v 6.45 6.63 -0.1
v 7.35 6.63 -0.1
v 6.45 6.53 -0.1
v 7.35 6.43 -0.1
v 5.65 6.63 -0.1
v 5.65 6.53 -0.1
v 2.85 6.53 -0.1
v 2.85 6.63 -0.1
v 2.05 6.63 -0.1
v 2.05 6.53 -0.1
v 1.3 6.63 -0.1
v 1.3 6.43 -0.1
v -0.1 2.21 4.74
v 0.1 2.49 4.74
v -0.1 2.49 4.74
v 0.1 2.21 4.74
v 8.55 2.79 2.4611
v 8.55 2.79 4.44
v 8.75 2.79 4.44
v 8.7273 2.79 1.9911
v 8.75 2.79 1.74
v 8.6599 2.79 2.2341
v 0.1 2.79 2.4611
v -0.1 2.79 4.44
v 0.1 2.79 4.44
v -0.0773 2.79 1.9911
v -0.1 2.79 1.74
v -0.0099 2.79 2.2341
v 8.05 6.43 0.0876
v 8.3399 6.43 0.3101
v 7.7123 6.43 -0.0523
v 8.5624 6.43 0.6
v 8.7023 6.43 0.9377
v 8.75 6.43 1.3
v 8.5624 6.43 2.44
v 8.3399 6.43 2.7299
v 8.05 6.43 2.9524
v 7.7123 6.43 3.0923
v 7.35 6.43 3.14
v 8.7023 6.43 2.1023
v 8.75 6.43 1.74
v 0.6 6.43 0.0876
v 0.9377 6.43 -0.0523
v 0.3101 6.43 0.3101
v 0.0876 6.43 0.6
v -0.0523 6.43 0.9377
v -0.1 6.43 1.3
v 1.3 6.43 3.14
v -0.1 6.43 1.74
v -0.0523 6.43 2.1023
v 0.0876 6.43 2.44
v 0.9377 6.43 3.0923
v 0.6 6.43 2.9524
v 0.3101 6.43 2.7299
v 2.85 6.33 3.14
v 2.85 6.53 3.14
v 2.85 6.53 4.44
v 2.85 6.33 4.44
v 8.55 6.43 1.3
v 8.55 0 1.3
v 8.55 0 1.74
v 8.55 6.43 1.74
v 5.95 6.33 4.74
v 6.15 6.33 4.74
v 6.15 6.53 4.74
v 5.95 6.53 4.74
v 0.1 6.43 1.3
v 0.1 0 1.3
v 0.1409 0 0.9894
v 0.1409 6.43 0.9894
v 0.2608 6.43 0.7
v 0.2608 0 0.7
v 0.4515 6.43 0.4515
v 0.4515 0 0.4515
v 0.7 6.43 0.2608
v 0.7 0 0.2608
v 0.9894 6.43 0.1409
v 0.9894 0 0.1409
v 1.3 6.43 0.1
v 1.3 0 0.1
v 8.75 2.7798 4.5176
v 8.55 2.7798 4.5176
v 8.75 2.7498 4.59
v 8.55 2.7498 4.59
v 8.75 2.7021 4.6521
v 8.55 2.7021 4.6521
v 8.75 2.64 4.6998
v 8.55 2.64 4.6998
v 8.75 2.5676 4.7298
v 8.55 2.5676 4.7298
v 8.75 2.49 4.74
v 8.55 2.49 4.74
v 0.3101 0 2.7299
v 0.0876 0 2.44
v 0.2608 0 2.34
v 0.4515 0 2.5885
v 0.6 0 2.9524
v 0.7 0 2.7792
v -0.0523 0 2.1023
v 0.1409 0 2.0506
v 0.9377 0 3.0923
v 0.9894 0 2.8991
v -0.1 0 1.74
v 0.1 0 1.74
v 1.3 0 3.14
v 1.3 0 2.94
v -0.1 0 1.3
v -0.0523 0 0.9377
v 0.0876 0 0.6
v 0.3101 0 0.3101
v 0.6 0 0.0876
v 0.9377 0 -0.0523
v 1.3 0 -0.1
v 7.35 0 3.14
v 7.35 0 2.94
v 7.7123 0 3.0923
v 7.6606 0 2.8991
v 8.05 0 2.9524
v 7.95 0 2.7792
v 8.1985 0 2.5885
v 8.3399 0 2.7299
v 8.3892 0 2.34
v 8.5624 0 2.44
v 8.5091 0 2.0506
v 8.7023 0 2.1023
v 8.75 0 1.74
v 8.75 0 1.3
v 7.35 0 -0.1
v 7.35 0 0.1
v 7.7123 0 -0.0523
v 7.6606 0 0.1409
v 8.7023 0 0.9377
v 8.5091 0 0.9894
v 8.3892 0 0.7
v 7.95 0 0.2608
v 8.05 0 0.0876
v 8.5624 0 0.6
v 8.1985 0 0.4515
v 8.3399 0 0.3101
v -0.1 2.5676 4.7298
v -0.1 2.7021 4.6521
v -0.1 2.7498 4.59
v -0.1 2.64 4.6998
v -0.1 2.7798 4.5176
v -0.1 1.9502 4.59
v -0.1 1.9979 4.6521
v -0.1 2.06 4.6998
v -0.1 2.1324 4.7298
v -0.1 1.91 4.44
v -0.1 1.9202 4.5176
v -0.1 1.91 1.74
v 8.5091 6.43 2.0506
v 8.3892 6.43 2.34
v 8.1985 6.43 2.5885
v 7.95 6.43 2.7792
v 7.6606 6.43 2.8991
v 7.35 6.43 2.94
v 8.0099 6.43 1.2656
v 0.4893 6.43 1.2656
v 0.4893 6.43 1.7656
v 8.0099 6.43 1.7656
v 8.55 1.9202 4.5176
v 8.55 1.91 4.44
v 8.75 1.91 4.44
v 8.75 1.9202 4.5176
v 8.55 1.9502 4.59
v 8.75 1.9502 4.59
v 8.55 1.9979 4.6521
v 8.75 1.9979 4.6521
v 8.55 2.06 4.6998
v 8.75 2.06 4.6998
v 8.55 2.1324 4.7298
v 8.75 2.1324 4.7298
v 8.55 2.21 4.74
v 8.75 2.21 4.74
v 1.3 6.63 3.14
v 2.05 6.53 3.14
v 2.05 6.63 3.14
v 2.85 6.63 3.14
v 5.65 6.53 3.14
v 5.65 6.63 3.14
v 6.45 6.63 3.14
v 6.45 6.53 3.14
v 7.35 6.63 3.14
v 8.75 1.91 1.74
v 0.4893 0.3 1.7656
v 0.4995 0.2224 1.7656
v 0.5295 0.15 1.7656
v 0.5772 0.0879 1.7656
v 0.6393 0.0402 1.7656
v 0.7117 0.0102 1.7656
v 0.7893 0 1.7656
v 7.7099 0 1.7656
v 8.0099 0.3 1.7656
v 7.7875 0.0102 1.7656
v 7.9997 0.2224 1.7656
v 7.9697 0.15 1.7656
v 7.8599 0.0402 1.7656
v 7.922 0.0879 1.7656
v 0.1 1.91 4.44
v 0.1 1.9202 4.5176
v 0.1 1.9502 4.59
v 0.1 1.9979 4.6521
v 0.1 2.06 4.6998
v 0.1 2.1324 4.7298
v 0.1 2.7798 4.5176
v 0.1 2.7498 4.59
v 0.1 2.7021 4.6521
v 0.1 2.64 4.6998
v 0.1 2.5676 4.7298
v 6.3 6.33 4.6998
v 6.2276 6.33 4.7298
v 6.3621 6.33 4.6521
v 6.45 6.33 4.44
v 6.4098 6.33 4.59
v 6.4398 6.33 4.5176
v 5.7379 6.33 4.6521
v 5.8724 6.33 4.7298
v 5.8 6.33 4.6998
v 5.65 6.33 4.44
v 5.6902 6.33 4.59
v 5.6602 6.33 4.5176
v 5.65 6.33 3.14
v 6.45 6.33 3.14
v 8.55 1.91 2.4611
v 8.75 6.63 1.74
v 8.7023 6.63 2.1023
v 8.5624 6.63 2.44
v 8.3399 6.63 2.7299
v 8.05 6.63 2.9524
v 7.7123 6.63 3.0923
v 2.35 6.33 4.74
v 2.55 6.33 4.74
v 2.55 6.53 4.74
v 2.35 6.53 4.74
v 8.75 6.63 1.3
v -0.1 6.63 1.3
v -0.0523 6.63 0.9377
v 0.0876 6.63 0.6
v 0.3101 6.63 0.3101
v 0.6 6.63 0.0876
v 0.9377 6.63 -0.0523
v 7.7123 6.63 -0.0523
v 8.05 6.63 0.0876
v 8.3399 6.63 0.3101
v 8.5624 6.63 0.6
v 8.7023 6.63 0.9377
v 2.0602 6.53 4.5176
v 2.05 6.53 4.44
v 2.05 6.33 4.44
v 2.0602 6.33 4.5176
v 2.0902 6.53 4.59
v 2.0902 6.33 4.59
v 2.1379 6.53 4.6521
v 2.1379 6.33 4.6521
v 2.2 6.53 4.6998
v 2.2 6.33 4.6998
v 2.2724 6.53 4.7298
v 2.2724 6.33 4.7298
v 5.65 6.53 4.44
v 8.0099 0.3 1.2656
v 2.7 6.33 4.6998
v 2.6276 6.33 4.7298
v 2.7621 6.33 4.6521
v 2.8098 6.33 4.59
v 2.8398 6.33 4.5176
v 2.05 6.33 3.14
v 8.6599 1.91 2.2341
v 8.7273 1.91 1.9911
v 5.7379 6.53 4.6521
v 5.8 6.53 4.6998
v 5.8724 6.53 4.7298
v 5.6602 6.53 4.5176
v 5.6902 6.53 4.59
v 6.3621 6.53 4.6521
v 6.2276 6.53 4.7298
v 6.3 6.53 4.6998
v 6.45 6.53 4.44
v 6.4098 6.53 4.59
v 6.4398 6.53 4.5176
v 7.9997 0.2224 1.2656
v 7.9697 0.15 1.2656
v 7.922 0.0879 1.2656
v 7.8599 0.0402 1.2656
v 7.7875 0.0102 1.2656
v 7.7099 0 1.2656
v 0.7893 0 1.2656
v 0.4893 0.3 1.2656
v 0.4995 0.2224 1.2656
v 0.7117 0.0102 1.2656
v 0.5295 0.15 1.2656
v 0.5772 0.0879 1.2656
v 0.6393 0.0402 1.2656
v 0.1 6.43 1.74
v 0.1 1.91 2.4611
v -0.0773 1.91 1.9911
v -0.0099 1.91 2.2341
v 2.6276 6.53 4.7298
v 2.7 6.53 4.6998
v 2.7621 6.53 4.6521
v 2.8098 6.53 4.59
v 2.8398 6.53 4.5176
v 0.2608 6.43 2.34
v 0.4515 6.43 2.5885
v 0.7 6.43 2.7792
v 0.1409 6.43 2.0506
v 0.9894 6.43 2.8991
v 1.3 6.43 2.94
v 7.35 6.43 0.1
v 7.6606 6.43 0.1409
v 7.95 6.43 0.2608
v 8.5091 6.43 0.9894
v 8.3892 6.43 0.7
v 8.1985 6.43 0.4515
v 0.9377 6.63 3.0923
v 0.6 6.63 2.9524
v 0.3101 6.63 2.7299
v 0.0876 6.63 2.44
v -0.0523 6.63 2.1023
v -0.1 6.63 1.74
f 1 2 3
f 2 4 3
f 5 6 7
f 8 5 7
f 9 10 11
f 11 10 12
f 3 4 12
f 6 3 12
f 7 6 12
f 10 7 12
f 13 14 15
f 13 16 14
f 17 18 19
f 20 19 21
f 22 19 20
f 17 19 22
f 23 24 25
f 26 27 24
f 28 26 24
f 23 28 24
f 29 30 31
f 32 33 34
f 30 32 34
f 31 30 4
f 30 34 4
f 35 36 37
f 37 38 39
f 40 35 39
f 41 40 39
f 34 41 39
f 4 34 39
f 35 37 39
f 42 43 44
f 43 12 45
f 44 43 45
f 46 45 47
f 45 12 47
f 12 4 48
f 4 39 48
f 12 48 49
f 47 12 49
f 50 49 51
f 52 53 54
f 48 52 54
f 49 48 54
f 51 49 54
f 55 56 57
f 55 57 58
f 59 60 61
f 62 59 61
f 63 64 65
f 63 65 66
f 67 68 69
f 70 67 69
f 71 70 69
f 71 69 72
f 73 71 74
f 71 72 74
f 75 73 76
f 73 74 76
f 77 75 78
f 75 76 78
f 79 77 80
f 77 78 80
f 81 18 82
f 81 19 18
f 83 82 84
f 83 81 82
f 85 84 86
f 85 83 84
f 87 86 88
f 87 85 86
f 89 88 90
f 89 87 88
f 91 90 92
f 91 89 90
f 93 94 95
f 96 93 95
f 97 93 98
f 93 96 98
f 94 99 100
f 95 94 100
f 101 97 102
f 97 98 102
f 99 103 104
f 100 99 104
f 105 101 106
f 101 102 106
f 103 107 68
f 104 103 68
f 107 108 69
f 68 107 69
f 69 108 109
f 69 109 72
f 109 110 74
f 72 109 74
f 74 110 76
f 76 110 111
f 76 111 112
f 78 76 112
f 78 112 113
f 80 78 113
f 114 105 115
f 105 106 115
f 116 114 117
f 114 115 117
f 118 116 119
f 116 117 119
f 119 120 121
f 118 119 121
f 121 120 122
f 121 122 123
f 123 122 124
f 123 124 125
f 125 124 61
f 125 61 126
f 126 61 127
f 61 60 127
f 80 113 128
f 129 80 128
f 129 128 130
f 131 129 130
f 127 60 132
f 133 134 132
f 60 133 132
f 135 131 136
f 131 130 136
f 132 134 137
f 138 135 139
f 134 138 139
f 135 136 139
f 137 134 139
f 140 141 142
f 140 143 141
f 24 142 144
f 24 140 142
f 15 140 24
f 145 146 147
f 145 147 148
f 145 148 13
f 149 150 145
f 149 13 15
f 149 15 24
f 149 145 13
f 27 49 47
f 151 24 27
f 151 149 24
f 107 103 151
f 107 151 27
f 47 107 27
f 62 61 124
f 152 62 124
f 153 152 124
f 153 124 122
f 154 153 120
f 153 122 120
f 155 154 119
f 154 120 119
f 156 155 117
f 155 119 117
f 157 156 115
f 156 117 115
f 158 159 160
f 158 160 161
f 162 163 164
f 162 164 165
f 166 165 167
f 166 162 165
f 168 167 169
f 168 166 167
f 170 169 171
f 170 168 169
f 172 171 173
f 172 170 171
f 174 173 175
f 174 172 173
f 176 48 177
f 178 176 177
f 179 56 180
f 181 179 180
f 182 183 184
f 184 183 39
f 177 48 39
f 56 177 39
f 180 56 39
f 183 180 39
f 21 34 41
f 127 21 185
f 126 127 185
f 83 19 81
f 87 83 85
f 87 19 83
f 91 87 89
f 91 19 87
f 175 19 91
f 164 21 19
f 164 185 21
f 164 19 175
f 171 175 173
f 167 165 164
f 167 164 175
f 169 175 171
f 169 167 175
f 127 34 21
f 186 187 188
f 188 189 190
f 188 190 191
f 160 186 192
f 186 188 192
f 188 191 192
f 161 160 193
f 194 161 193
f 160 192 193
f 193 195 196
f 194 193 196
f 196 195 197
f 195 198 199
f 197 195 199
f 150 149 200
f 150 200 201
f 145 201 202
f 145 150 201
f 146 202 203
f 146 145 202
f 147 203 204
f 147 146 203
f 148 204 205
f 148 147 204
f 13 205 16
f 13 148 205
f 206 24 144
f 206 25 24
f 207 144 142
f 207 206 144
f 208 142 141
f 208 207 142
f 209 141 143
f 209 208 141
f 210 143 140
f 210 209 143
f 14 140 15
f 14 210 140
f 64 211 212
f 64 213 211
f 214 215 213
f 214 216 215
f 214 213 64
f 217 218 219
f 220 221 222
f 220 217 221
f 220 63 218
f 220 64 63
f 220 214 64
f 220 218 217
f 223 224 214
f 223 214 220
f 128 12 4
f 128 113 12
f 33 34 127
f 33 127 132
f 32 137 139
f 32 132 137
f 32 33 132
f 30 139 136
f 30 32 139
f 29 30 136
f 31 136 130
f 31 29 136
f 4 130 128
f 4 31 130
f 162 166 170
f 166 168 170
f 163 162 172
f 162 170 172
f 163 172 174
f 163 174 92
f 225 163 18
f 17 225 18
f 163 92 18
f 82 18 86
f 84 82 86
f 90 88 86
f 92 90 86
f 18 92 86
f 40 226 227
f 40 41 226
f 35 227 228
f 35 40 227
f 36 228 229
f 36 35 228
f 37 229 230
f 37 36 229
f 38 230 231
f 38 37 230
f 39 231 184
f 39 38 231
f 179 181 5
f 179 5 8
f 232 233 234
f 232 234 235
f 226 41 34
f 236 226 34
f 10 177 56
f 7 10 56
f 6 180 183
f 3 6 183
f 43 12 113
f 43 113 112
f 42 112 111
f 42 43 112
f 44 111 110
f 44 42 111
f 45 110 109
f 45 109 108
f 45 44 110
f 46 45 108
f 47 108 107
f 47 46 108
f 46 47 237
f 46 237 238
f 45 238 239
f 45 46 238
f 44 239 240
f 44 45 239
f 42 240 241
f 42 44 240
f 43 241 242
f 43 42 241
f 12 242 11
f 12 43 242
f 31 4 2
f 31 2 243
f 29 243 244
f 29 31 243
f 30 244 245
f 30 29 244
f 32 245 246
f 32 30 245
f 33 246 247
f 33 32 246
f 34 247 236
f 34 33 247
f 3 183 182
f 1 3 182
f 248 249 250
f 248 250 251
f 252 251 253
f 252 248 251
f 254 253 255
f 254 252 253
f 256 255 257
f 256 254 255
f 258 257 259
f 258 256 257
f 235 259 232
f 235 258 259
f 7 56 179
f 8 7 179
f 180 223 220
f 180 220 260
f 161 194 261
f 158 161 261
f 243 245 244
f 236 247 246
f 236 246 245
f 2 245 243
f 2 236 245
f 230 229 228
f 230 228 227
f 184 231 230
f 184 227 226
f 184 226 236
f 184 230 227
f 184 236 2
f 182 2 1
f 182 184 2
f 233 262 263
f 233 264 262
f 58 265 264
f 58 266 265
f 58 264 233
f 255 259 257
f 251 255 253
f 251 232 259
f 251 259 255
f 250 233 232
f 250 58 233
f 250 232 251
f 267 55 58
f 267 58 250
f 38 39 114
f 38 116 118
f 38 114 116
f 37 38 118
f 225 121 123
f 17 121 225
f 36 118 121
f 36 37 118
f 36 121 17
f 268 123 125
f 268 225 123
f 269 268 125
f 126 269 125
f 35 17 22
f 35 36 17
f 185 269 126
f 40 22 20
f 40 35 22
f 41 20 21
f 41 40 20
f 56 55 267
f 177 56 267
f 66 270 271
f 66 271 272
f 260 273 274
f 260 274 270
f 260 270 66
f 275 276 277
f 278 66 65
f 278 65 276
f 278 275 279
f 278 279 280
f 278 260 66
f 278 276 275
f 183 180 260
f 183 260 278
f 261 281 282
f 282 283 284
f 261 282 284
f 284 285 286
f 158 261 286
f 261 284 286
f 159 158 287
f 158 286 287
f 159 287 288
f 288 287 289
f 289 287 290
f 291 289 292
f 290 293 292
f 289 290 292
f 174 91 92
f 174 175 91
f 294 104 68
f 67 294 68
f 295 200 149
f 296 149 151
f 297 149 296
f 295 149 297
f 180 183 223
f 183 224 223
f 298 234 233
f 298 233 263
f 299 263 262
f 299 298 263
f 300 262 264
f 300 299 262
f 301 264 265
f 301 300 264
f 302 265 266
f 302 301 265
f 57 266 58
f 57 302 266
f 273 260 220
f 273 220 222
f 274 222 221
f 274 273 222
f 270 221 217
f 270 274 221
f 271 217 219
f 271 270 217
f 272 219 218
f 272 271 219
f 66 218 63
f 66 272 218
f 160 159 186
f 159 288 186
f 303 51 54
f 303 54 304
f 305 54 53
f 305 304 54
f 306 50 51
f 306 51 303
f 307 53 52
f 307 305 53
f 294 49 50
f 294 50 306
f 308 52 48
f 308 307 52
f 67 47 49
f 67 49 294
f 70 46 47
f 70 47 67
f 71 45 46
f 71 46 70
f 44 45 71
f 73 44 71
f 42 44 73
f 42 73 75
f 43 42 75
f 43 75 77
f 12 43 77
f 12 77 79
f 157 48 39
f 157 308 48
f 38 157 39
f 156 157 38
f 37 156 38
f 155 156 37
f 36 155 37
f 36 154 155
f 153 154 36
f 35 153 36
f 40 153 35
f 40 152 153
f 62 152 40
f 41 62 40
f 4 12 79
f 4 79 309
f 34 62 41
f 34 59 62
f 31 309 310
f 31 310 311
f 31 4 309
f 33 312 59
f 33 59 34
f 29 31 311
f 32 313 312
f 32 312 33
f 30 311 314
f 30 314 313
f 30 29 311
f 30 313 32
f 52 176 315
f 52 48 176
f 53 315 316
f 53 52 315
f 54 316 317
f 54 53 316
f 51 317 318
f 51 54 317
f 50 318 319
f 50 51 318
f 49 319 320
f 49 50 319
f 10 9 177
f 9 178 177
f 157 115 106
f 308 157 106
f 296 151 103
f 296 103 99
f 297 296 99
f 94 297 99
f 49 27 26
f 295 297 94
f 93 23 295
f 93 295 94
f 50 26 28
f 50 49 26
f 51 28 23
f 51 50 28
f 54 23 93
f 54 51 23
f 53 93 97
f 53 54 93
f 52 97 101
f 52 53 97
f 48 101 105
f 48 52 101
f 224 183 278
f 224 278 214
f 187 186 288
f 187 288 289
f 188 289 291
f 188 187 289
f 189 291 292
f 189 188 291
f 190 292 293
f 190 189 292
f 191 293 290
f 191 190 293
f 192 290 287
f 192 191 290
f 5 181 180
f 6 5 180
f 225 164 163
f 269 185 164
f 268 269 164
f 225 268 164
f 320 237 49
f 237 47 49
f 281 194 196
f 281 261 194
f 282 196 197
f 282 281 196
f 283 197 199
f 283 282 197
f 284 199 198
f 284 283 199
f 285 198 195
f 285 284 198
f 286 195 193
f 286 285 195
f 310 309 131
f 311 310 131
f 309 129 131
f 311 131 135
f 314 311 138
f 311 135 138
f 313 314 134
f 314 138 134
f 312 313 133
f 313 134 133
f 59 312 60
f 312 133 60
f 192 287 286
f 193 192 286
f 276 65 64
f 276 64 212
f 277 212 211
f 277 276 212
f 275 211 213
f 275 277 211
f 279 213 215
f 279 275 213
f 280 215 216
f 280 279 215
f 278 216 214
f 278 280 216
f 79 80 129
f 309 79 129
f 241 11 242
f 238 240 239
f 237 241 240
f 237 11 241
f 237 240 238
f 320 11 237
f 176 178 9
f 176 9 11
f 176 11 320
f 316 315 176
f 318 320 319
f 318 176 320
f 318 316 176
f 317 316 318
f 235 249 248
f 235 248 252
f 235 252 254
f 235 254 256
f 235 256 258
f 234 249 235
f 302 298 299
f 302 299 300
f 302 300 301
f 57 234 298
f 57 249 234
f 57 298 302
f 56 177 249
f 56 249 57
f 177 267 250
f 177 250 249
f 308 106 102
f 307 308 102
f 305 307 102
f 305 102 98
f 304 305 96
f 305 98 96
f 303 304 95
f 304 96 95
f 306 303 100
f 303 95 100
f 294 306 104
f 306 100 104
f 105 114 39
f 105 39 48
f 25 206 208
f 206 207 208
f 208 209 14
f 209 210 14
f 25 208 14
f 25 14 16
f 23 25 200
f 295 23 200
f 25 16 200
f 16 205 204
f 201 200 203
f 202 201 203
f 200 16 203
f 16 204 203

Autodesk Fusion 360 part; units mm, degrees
sketch "Sketch1" plane through (0, 0, 0) normal (0, 1, 0) x (1, 0, 0)
  line L0 (0.1, -0.1) -> (8.55, -0.1) construction
  line L1 (8.55, -0.1) -> (8.55, -2.94) construction
  line L2 (8.55, -2.94) -> (0.1, -2.94) construction
  line L3 (0.1, -2.94) -> (0.1, -0.1) construction
  line L4 (-0.1, 0.1) -> (8.75, 0.1)
  line L5 (8.75, 0.1) -> (8.75, -3.14)
  line L6 (8.75, -3.14) -> (-0.1, -3.14)
  line L7 (-0.1, -3.14) -> (-0.1, 0.1)
  line L8 (0, 0) -> (8.65, 0) construction
  line L9 (8.65, 0) -> (8.65, -3.04) construction
  line L10 (8.65, -3.04) -> (0, -3.04) construction
  line L11 (0, -3.04) -> (0, 0) construction
  dimension "d4" = -0.2
  dimension "d5" = -0.1
extrude "Extrude1" add sketch "Sketch1" along normal blind 6.43 makes body 1
fillet "Fillet1" radius 1.4 4 edges at (8.75, 3.215, 3.14) (8.75, 3.215, -0.1) (-0.1, 3.215, 3.14) (-0.1, 3.215, -0.1) on bodies 1
sketch "Sketch2" plane through (0, 0, 0) normal (0, -1, 0) x (1, 0, 0)
  arc A0 (-0.1, 1.3) -> (1.3, -0.1) centre (1.3, 1.3) ccw
  line L0 (1.3, -0.1) -> (7.35, -0.1)
  arc A1 (7.35, -0.1) -> (8.75, 1.3) centre (7.35, 1.3) ccw
  line L1 (8.75, 1.3) -> (8.75, 1.74)
  arc A2 (8.75, 1.74) -> (7.35, 3.14) centre (7.35, 1.74) ccw
  line L2 (7.35, 3.14) -> (1.3, 3.14)
  arc A3 (1.3, 3.14) -> (-0.1, 1.74) centre (1.3, 1.74) ccw
  line L3 (-0.1, 1.74) -> (-0.1, 1.3)
  line L4 (0.1, 1.74) -> (0.1, 1.3)
  arc A4 (0.1, 1.3) -> (1.3, 0.1) centre (1.3, 1.3) ccw
  line L5 (1.3, 0.1) -> (7.35, 0.1)
  arc A5 (7.35, 0.1) -> (8.55, 1.3) centre (7.35, 1.3) ccw
  line L6 (8.55, 1.3) -> (8.55, 1.74)
  arc A6 (8.55, 1.74) -> (7.35, 2.94) centre (7.35, 1.74) ccw
  line L7 (7.35, 2.94) -> (1.3, 2.94)
  arc A7 (1.3, 2.94) -> (0.1, 1.74) centre (1.3, 1.74) ccw
  dimension "d10" = -0.2
extrude "Extrude2" cut sketch "Sketch2" against normal blind 6.43 contours L4 A4 L5 A5 L6 A6 L7 A7 bodies 1
sketch "Sketch3" plane through (0, 6.43, 0) normal (0, 1, 0) x (-1, 0, 0)
  line L0 (-0.1, 1.74) -> (-0.1, 1.3)
  arc A0 (-1.3, 0.1) -> (-0.1, 1.3) centre (-1.3, 1.3) ccw
  line L1 (-1.3, 0.1) -> (-7.35, 0.1)
  arc A1 (-8.55, 1.3) -> (-7.35, 0.1) centre (-7.35, 1.3) ccw
  line L2 (-8.55, 1.3) -> (-8.55, 1.74)
  arc A2 (-7.35, 2.94) -> (-8.55, 1.74) centre (-7.35, 1.74) ccw
  line L3 (-7.35, 2.94) -> (-1.3, 2.94)
  arc A3 (-0.1, 1.74) -> (-1.3, 2.94) centre (-1.3, 1.74) ccw
  arc A4 (-1.3, -0.1) -> (0.1, 1.3) centre (-1.3, 1.3) ccw
  line L4 (0.1, 1.3) -> (0.1, 1.74)
  arc A5 (0.1, 1.74) -> (-1.3, 3.14) centre (-1.3, 1.74) ccw
  line L5 (-1.3, 3.14) -> (-7.35, 3.14)
  arc A6 (-7.35, 3.14) -> (-8.75, 1.74) centre (-7.35, 1.74) ccw
  line L6 (-8.75, 1.74) -> (-8.75, 1.3)
  arc A7 (-8.75, 1.3) -> (-7.35, -0.1) centre (-7.35, 1.3) ccw
  line L7 (-7.35, -0.1) -> (-1.3, -0.1)
  line L8 (-7.35, 3.14) -> (-1.3, 3.14)
  line L9 (0.1, 1.74) -> (0.1, 1.3)
  line L10 (-1.3, -0.1) -> (-7.35, -0.1)
  line L11 (-8.75, 1.3) -> (-8.75, 1.74)
  spline S0 degree 5 poles (-7.35, -0.1) (-7.4476, -0.1) (-7.6354, -0.0851) (-7.8944, -0.0183) (-8.1972, 0.1488) (-8.5012, 0.4528) (-8.6683, 0.7556) (-8.7351, 1.0146) (-8.75, 1.2024) (-8.75, 1.3) knots 0 0 0 0 0 0 0.2 0.4 0.6 0.8 1 1 1 1 1 1
  spline S1 degree 5 poles (-8.75, 1.74) (-8.75, 1.8376) (-8.7351, 2.0254) (-8.6683, 2.2844) (-8.5012, 2.5872) (-8.1972, 2.8912) (-7.8944, 3.0583) (-7.6354, 3.1251) (-7.4476, 3.14) (-7.35, 3.14) knots 0 0 0 0 0 0 0.2 0.4 0.6 0.8 1 1 1 1 1 1
  spline S2 degree 5 poles (-1.3, -0.1) (-1.2024, -0.1) (-1.0146, -0.0851) (-0.7556, -0.0183) (-0.4528, 0.1488) (-0.1488, 0.4528) (0.0183, 0.7556) (0.0851, 1.0146) (0.1, 1.2024) (0.1, 1.3) knots 0 0 0 0 0 0 0.2 0.4 0.6 0.8 1 1 1 1 1 1
  spline S3 degree 5 poles (0.1, 1.74) (0.1, 1.8376) (0.0851, 2.0254) (0.0183, 2.2844) (-0.1488, 2.5872) (-0.4528, 2.8912) (-0.7556, 3.0583) (-1.0146, 3.1251) (-1.2024, 3.14) (-1.3, 3.14) knots 0 0 0 0 0 0 0.2 0.4 0.6 0.8 1 1 1 1 1 1
extrude "Extrude3" add sketch "Sketch3" along normal blind 0.2 separate body contours L0 A0 L1 A1 L2 A2 L3 A3 | A4 L4 A5 L5 A6 L6 A7 L7 L8 L9 L10 L11 S0 S1 S2 S3 makes body 2
sketch "Sketch4" plane through (0, 0, 0) normal (0, 1, 0) x (1, 0, 0)
  line L0 (8.6991, -3.1025) -> (0, 0) construction
  line L1 (-0.1103, -3.1118) -> (8.7397, 0.1282) construction
  line L2 (4.2496, -1.5156) -> (4.3035, 0.7511) construction
  line L3 (8.0099, -1.2656) -> (0.4893, -1.2656)
  line L4 (0.4893, -1.2656) -> (0.4893, -1.7656)
  line L5 (0.4893, -1.7656) -> (8.0099, -1.7656)
  line L6 (8.0099, -1.7656) -> (8.0099, -1.2656)
  line L7 (8.0099, -1.2656) -> (0.4893, -1.7656) construction
  line L8 (0.4893, -1.2656) -> (8.0099, -1.7656) construction
  point P0 (4.2496, -1.5156)
  dimension "d15" = 0.5
extrude "Extrude4" add sketch "Sketch4" along normal blind 6.43 separate body makes body 3
fillet "Fillet2" radius 0.3 2 edges at (8.0099, 0, 1.5156) (0.4893, 0, 1.5156) on bodies 3
sketch "Sketch5" plane through (0, 0, 3.14) normal (0, 0, 1) x (-1, 0, 0)
  line L0 (-1.3, -6.43) -> (-1.3, 0)
  line L1 (-1.3, 0) -> (-7.35, 0)
  line L2 (-7.35, 0) -> (-7.35, -6.43)
  line L3 (-7.35, -6.43) -> (-1.3, -6.43)
  line L4 (-4.25, 0.05) -> (-4.25, -8) construction
  line L5 (0, 0) -> (-8.7598, -6.43) construction
  line L6 (-4.25, -6.43) -> (-2.45, -6.43) construction
  line L7 (-4.25, -6.43) -> (-6.05, -6.43) construction
  line L8 (-5.65, -6.53) -> (-6.45, -6.53)
  line L9 (-6.45, -6.53) -> (-6.45, -6.33)
  line L10 (-6.45, -6.33) -> (-5.65, -6.33)
  line L11 (-5.65, -6.33) -> (-5.65, -6.53)
  line L12 (-5.65, -6.53) -> (-6.45, -6.33) construction
  line L13 (-6.45, -6.53) -> (-5.65, -6.33) construction
  line L14 (-2.05, -6.53) -> (-2.85, -6.53)
  line L15 (-2.85, -6.53) -> (-2.85, -6.33)
  line L16 (-2.85, -6.33) -> (-2.05, -6.33)
  line L17 (-2.05, -6.33) -> (-2.05, -6.53)
  line L18 (-2.05, -6.53) -> (-2.85, -6.33) construction
  line L19 (-2.85, -6.53) -> (-2.05, -6.33) construction
  line L20 (-6.45, -6.53) -> (-6.45, -6.63)
  line L21 (-6.45, -6.63) -> (-5.65, -6.63)
  line L22 (-5.65, -6.63) -> (-5.65, -6.53)
  line L23 (-2.85, -6.53) -> (-2.85, -6.63)
  line L24 (-2.85, -6.63) -> (-2.05, -6.63)
  line L25 (-2.05, -6.63) -> (-2.05, -6.53)
  point P0 (-6.05, -6.43)
  point P1 (-2.45, -6.43)
  dimension "d20" = 1.8
  dimension "d21" = 1.8
  dimension "d22" = 0.8
  dimension "d23" = 0.2
  dimension "d24" = 0.8
  dimension "d25" = 0.2
extrude "Extrude5" add sketch "Sketch5" along normal blind 1.6 separate body contours L3 L14 L15 L17 | L3 L15 L16 L17 | L3 L8 L9 L11 | L3 L9 L10 L11 makes body 4 at (6.1833, 6.33, 3.6733) makes body 5 at (2.5833, 6.33, 3.6733)
fillet "Fillet3" radius 0.3 4 edges at (5.65, 6.43, 4.74) (6.45, 6.43, 4.74) (2.85, 6.43, 4.74) (2.05, 6.43, 4.74) on bodies 4 5
extrude "Extrude6" cut sketch "Sketch5" against normal blind 3.3 contours L14 L23 L24 L25 | L8 L20 L21 L22 bodies 2
sketch "Sketch6" plane through (0, 0, 3.14) normal (0, 0, 1) x (-1, 0, 0)
  line L0 (-1.3, -6.43) -> (-1.3, 0)
  line L1 (-1.3, 0) -> (-7.35, 0)
  line L2 (-7.35, 0) -> (-7.35, -6.43)
  line L3 (-7.35, -6.43) -> (-1.3, -6.43)
  line L4 (1.0089, -6.43) -> (-10, -6.43) construction
  line L5 (0.1, -6.7) -> (0.1, 0.5) construction
  line L6 (-8.75, -6.7) -> (-8.75, 0.5) construction
  line L7 (0.1, -6.43) -> (0.1, -2.35) construction
  line L8 (0.1, -2.35) -> (-8.75, -2.35) construction
  line L9 (-8.55, -2.79) -> (-8.75, -2.79)
  line L10 (-8.75, -2.79) -> (-8.75, -1.91)
  line L11 (-8.75, -1.91) -> (-8.55, -1.91)
  line L12 (-8.55, -1.91) -> (-8.55, -2.79)
  line L13 (-8.75, -2.79) -> (-8.55, -1.91) construction
  line L14 (-8.55, -2.79) -> (-8.75, -1.91) construction
  line L15 (-0.1, -2.79) -> (0.1, -1.91) construction
  line L16 (0, -2.35) -> (0.1, -2.35) construction
  line L17 (-0.1, -2.79) -> (-0.1, -1.91)
  line L18 (-0.1, -1.91) -> (0.1, -1.91)
  line L19 (0.1, -1.91) -> (0.1, -2.79)
  line L20 (0.1, -2.79) -> (-0.1, -2.79)
  line L21 (0.1, -2.79) -> (-0.1, -1.91) construction
  line L22 (-8.65, -2.35) -> (-8.75, -2.35) construction
  dimension "d32" = 4.08
  dimension "d33" = 0.2
  dimension "d34" = 0.88
  dimension "d35" = 0.2
  dimension "d36" = 0.88
extrude "Extrude7" add sketch "Sketch6" along normal blind 1.6 separate body contours L9 L10 L11 L12 | L17 L18 L19 L20 makes body 6 at (8.75, 2.4967, 3.6733) makes body 7 at (0.1, 2.4967, 3.6733)
fillet "Fillet4" radius 0.3 4 edges at (8.65, 2.79, 4.74) (8.65, 1.91, 4.74) (0, 1.91, 4.74) (0, 2.79, 4.74) on bodies 6 7
extrude "Extrude8" add 2 faces at (0.0333, 2.2033, 3.14) (8.6833, 2.2033, 3.14) along direction (0, 0, -1) blind 1.4 on bodies 6 7 bodies 1 2 3 4 5 7 6
